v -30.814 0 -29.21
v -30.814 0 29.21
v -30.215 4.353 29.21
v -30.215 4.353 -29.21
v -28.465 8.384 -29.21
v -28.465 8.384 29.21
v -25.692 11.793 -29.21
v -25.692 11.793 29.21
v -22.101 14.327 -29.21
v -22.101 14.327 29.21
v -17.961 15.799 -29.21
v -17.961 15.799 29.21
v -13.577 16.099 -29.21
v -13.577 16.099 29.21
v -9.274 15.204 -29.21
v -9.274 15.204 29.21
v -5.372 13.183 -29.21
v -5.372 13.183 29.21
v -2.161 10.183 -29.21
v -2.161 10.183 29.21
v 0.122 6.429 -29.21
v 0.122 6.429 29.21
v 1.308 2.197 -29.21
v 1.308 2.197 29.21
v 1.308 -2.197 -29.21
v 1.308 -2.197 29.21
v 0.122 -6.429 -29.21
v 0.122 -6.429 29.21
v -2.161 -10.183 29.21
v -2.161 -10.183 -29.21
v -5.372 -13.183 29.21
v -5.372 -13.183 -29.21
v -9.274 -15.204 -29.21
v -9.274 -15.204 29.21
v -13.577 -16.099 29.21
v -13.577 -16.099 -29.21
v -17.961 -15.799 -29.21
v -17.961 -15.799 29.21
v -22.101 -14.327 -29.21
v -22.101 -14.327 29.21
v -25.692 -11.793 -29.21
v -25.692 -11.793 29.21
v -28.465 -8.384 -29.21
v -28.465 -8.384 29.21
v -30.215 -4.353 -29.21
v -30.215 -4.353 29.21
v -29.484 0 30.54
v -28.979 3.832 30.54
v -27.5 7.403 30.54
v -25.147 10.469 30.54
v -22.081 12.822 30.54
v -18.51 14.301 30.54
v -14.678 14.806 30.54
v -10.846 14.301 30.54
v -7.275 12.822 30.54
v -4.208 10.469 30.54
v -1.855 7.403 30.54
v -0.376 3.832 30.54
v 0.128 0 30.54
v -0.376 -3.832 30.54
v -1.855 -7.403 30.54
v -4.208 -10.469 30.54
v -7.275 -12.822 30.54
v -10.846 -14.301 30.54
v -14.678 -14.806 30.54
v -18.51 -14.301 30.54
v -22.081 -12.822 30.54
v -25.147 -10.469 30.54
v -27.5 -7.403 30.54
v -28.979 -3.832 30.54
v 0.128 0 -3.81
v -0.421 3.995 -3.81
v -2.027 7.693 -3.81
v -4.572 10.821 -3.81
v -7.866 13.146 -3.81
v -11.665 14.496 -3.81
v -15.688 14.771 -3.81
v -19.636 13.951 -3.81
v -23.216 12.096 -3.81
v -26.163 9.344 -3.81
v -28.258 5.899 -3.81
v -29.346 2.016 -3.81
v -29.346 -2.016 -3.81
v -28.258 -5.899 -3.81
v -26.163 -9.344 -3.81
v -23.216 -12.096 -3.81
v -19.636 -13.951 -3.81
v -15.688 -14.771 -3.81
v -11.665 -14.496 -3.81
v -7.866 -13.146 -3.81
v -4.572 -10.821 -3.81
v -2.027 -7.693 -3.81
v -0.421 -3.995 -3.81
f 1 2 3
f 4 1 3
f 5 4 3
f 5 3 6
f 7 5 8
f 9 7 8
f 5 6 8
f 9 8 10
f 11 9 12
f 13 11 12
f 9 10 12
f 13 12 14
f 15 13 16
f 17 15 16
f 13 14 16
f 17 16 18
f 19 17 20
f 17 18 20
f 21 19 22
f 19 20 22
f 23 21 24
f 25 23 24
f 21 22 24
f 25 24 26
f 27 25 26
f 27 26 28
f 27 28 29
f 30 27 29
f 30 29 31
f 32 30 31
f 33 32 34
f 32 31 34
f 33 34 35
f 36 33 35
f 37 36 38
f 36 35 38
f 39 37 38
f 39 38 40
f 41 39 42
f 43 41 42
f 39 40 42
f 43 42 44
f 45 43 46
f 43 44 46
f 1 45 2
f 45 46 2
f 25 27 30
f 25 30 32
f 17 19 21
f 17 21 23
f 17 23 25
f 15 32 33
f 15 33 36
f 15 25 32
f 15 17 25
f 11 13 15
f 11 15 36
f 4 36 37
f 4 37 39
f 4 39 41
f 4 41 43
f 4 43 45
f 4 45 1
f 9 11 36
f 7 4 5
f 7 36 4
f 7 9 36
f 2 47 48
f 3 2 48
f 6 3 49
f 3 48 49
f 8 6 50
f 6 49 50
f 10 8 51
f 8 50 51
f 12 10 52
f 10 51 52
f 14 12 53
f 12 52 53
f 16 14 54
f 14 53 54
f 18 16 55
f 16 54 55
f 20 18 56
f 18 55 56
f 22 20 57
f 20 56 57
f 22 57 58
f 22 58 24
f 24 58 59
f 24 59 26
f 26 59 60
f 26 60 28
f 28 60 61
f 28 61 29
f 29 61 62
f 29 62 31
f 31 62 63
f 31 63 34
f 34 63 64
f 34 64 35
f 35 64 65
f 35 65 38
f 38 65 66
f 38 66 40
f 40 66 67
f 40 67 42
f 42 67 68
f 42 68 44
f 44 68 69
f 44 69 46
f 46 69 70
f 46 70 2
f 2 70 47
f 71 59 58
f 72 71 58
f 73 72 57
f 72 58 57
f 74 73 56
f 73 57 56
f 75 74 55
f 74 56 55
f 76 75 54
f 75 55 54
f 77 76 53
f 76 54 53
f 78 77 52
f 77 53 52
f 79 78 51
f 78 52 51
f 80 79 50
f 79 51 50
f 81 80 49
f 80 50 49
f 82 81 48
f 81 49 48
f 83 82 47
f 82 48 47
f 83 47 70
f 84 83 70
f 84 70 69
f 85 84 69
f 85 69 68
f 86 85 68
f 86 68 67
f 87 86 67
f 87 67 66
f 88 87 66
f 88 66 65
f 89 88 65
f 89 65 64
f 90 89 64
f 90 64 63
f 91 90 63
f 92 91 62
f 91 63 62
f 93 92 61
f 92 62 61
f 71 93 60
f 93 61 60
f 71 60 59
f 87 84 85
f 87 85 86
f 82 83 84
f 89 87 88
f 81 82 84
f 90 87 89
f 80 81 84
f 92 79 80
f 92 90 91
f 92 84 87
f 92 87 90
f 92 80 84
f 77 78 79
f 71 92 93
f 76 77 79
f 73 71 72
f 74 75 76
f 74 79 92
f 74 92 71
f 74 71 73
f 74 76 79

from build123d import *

# Parameters (mm, degrees)
F0_W     = 16.1361260527
F0_H     = 63.5
F2_R     = 14.8058887609
F3_DEPTH = 38.1


# Not quite as in the source:
# - a fillet or chamfer that OpenCascade refuses, or shapes differently, is made with other operations: its cross-section is extruded or revolved along the edge and cut away or added


with BuildPart() as f1:
    # F0 (on Front) → F1 (revolve)
    with BuildSketch(Plane.XZ):
        with Locations((-22.7458069295, 2.539942234)):
            Rectangle(F0_W, F0_H)
    revolve(axis=Axis((-14.6777439032, 0, 2.539942234), (0, 0, -1)))

    # F2 (on face) → F3 (cut)
    with BuildSketch(Plane.XY.offset(34.289942234)):
        with Locations((-14.6777439032, 0)):
            Circle(F2_R)
    extrude(amount=-F3_DEPTH, mode=Mode.SUBTRACT)

    # F4: chamfer of 5.08 on 1 edges, made by hand

    # F4_s1 → F4_t2 (revolve, cut)
    with BuildSketch(Plane.XZ):
        Polygon((-30.8138699559, 29.209942234), (-25.7338699559, 34.289942234), (-30.8138699559, 34.289942234), align=None)
    revolve(axis=Axis((-14.6777439032, 0, 34.289942234), (0, 0, -1)), mode=Mode.SUBTRACT)


solid = f1.part
